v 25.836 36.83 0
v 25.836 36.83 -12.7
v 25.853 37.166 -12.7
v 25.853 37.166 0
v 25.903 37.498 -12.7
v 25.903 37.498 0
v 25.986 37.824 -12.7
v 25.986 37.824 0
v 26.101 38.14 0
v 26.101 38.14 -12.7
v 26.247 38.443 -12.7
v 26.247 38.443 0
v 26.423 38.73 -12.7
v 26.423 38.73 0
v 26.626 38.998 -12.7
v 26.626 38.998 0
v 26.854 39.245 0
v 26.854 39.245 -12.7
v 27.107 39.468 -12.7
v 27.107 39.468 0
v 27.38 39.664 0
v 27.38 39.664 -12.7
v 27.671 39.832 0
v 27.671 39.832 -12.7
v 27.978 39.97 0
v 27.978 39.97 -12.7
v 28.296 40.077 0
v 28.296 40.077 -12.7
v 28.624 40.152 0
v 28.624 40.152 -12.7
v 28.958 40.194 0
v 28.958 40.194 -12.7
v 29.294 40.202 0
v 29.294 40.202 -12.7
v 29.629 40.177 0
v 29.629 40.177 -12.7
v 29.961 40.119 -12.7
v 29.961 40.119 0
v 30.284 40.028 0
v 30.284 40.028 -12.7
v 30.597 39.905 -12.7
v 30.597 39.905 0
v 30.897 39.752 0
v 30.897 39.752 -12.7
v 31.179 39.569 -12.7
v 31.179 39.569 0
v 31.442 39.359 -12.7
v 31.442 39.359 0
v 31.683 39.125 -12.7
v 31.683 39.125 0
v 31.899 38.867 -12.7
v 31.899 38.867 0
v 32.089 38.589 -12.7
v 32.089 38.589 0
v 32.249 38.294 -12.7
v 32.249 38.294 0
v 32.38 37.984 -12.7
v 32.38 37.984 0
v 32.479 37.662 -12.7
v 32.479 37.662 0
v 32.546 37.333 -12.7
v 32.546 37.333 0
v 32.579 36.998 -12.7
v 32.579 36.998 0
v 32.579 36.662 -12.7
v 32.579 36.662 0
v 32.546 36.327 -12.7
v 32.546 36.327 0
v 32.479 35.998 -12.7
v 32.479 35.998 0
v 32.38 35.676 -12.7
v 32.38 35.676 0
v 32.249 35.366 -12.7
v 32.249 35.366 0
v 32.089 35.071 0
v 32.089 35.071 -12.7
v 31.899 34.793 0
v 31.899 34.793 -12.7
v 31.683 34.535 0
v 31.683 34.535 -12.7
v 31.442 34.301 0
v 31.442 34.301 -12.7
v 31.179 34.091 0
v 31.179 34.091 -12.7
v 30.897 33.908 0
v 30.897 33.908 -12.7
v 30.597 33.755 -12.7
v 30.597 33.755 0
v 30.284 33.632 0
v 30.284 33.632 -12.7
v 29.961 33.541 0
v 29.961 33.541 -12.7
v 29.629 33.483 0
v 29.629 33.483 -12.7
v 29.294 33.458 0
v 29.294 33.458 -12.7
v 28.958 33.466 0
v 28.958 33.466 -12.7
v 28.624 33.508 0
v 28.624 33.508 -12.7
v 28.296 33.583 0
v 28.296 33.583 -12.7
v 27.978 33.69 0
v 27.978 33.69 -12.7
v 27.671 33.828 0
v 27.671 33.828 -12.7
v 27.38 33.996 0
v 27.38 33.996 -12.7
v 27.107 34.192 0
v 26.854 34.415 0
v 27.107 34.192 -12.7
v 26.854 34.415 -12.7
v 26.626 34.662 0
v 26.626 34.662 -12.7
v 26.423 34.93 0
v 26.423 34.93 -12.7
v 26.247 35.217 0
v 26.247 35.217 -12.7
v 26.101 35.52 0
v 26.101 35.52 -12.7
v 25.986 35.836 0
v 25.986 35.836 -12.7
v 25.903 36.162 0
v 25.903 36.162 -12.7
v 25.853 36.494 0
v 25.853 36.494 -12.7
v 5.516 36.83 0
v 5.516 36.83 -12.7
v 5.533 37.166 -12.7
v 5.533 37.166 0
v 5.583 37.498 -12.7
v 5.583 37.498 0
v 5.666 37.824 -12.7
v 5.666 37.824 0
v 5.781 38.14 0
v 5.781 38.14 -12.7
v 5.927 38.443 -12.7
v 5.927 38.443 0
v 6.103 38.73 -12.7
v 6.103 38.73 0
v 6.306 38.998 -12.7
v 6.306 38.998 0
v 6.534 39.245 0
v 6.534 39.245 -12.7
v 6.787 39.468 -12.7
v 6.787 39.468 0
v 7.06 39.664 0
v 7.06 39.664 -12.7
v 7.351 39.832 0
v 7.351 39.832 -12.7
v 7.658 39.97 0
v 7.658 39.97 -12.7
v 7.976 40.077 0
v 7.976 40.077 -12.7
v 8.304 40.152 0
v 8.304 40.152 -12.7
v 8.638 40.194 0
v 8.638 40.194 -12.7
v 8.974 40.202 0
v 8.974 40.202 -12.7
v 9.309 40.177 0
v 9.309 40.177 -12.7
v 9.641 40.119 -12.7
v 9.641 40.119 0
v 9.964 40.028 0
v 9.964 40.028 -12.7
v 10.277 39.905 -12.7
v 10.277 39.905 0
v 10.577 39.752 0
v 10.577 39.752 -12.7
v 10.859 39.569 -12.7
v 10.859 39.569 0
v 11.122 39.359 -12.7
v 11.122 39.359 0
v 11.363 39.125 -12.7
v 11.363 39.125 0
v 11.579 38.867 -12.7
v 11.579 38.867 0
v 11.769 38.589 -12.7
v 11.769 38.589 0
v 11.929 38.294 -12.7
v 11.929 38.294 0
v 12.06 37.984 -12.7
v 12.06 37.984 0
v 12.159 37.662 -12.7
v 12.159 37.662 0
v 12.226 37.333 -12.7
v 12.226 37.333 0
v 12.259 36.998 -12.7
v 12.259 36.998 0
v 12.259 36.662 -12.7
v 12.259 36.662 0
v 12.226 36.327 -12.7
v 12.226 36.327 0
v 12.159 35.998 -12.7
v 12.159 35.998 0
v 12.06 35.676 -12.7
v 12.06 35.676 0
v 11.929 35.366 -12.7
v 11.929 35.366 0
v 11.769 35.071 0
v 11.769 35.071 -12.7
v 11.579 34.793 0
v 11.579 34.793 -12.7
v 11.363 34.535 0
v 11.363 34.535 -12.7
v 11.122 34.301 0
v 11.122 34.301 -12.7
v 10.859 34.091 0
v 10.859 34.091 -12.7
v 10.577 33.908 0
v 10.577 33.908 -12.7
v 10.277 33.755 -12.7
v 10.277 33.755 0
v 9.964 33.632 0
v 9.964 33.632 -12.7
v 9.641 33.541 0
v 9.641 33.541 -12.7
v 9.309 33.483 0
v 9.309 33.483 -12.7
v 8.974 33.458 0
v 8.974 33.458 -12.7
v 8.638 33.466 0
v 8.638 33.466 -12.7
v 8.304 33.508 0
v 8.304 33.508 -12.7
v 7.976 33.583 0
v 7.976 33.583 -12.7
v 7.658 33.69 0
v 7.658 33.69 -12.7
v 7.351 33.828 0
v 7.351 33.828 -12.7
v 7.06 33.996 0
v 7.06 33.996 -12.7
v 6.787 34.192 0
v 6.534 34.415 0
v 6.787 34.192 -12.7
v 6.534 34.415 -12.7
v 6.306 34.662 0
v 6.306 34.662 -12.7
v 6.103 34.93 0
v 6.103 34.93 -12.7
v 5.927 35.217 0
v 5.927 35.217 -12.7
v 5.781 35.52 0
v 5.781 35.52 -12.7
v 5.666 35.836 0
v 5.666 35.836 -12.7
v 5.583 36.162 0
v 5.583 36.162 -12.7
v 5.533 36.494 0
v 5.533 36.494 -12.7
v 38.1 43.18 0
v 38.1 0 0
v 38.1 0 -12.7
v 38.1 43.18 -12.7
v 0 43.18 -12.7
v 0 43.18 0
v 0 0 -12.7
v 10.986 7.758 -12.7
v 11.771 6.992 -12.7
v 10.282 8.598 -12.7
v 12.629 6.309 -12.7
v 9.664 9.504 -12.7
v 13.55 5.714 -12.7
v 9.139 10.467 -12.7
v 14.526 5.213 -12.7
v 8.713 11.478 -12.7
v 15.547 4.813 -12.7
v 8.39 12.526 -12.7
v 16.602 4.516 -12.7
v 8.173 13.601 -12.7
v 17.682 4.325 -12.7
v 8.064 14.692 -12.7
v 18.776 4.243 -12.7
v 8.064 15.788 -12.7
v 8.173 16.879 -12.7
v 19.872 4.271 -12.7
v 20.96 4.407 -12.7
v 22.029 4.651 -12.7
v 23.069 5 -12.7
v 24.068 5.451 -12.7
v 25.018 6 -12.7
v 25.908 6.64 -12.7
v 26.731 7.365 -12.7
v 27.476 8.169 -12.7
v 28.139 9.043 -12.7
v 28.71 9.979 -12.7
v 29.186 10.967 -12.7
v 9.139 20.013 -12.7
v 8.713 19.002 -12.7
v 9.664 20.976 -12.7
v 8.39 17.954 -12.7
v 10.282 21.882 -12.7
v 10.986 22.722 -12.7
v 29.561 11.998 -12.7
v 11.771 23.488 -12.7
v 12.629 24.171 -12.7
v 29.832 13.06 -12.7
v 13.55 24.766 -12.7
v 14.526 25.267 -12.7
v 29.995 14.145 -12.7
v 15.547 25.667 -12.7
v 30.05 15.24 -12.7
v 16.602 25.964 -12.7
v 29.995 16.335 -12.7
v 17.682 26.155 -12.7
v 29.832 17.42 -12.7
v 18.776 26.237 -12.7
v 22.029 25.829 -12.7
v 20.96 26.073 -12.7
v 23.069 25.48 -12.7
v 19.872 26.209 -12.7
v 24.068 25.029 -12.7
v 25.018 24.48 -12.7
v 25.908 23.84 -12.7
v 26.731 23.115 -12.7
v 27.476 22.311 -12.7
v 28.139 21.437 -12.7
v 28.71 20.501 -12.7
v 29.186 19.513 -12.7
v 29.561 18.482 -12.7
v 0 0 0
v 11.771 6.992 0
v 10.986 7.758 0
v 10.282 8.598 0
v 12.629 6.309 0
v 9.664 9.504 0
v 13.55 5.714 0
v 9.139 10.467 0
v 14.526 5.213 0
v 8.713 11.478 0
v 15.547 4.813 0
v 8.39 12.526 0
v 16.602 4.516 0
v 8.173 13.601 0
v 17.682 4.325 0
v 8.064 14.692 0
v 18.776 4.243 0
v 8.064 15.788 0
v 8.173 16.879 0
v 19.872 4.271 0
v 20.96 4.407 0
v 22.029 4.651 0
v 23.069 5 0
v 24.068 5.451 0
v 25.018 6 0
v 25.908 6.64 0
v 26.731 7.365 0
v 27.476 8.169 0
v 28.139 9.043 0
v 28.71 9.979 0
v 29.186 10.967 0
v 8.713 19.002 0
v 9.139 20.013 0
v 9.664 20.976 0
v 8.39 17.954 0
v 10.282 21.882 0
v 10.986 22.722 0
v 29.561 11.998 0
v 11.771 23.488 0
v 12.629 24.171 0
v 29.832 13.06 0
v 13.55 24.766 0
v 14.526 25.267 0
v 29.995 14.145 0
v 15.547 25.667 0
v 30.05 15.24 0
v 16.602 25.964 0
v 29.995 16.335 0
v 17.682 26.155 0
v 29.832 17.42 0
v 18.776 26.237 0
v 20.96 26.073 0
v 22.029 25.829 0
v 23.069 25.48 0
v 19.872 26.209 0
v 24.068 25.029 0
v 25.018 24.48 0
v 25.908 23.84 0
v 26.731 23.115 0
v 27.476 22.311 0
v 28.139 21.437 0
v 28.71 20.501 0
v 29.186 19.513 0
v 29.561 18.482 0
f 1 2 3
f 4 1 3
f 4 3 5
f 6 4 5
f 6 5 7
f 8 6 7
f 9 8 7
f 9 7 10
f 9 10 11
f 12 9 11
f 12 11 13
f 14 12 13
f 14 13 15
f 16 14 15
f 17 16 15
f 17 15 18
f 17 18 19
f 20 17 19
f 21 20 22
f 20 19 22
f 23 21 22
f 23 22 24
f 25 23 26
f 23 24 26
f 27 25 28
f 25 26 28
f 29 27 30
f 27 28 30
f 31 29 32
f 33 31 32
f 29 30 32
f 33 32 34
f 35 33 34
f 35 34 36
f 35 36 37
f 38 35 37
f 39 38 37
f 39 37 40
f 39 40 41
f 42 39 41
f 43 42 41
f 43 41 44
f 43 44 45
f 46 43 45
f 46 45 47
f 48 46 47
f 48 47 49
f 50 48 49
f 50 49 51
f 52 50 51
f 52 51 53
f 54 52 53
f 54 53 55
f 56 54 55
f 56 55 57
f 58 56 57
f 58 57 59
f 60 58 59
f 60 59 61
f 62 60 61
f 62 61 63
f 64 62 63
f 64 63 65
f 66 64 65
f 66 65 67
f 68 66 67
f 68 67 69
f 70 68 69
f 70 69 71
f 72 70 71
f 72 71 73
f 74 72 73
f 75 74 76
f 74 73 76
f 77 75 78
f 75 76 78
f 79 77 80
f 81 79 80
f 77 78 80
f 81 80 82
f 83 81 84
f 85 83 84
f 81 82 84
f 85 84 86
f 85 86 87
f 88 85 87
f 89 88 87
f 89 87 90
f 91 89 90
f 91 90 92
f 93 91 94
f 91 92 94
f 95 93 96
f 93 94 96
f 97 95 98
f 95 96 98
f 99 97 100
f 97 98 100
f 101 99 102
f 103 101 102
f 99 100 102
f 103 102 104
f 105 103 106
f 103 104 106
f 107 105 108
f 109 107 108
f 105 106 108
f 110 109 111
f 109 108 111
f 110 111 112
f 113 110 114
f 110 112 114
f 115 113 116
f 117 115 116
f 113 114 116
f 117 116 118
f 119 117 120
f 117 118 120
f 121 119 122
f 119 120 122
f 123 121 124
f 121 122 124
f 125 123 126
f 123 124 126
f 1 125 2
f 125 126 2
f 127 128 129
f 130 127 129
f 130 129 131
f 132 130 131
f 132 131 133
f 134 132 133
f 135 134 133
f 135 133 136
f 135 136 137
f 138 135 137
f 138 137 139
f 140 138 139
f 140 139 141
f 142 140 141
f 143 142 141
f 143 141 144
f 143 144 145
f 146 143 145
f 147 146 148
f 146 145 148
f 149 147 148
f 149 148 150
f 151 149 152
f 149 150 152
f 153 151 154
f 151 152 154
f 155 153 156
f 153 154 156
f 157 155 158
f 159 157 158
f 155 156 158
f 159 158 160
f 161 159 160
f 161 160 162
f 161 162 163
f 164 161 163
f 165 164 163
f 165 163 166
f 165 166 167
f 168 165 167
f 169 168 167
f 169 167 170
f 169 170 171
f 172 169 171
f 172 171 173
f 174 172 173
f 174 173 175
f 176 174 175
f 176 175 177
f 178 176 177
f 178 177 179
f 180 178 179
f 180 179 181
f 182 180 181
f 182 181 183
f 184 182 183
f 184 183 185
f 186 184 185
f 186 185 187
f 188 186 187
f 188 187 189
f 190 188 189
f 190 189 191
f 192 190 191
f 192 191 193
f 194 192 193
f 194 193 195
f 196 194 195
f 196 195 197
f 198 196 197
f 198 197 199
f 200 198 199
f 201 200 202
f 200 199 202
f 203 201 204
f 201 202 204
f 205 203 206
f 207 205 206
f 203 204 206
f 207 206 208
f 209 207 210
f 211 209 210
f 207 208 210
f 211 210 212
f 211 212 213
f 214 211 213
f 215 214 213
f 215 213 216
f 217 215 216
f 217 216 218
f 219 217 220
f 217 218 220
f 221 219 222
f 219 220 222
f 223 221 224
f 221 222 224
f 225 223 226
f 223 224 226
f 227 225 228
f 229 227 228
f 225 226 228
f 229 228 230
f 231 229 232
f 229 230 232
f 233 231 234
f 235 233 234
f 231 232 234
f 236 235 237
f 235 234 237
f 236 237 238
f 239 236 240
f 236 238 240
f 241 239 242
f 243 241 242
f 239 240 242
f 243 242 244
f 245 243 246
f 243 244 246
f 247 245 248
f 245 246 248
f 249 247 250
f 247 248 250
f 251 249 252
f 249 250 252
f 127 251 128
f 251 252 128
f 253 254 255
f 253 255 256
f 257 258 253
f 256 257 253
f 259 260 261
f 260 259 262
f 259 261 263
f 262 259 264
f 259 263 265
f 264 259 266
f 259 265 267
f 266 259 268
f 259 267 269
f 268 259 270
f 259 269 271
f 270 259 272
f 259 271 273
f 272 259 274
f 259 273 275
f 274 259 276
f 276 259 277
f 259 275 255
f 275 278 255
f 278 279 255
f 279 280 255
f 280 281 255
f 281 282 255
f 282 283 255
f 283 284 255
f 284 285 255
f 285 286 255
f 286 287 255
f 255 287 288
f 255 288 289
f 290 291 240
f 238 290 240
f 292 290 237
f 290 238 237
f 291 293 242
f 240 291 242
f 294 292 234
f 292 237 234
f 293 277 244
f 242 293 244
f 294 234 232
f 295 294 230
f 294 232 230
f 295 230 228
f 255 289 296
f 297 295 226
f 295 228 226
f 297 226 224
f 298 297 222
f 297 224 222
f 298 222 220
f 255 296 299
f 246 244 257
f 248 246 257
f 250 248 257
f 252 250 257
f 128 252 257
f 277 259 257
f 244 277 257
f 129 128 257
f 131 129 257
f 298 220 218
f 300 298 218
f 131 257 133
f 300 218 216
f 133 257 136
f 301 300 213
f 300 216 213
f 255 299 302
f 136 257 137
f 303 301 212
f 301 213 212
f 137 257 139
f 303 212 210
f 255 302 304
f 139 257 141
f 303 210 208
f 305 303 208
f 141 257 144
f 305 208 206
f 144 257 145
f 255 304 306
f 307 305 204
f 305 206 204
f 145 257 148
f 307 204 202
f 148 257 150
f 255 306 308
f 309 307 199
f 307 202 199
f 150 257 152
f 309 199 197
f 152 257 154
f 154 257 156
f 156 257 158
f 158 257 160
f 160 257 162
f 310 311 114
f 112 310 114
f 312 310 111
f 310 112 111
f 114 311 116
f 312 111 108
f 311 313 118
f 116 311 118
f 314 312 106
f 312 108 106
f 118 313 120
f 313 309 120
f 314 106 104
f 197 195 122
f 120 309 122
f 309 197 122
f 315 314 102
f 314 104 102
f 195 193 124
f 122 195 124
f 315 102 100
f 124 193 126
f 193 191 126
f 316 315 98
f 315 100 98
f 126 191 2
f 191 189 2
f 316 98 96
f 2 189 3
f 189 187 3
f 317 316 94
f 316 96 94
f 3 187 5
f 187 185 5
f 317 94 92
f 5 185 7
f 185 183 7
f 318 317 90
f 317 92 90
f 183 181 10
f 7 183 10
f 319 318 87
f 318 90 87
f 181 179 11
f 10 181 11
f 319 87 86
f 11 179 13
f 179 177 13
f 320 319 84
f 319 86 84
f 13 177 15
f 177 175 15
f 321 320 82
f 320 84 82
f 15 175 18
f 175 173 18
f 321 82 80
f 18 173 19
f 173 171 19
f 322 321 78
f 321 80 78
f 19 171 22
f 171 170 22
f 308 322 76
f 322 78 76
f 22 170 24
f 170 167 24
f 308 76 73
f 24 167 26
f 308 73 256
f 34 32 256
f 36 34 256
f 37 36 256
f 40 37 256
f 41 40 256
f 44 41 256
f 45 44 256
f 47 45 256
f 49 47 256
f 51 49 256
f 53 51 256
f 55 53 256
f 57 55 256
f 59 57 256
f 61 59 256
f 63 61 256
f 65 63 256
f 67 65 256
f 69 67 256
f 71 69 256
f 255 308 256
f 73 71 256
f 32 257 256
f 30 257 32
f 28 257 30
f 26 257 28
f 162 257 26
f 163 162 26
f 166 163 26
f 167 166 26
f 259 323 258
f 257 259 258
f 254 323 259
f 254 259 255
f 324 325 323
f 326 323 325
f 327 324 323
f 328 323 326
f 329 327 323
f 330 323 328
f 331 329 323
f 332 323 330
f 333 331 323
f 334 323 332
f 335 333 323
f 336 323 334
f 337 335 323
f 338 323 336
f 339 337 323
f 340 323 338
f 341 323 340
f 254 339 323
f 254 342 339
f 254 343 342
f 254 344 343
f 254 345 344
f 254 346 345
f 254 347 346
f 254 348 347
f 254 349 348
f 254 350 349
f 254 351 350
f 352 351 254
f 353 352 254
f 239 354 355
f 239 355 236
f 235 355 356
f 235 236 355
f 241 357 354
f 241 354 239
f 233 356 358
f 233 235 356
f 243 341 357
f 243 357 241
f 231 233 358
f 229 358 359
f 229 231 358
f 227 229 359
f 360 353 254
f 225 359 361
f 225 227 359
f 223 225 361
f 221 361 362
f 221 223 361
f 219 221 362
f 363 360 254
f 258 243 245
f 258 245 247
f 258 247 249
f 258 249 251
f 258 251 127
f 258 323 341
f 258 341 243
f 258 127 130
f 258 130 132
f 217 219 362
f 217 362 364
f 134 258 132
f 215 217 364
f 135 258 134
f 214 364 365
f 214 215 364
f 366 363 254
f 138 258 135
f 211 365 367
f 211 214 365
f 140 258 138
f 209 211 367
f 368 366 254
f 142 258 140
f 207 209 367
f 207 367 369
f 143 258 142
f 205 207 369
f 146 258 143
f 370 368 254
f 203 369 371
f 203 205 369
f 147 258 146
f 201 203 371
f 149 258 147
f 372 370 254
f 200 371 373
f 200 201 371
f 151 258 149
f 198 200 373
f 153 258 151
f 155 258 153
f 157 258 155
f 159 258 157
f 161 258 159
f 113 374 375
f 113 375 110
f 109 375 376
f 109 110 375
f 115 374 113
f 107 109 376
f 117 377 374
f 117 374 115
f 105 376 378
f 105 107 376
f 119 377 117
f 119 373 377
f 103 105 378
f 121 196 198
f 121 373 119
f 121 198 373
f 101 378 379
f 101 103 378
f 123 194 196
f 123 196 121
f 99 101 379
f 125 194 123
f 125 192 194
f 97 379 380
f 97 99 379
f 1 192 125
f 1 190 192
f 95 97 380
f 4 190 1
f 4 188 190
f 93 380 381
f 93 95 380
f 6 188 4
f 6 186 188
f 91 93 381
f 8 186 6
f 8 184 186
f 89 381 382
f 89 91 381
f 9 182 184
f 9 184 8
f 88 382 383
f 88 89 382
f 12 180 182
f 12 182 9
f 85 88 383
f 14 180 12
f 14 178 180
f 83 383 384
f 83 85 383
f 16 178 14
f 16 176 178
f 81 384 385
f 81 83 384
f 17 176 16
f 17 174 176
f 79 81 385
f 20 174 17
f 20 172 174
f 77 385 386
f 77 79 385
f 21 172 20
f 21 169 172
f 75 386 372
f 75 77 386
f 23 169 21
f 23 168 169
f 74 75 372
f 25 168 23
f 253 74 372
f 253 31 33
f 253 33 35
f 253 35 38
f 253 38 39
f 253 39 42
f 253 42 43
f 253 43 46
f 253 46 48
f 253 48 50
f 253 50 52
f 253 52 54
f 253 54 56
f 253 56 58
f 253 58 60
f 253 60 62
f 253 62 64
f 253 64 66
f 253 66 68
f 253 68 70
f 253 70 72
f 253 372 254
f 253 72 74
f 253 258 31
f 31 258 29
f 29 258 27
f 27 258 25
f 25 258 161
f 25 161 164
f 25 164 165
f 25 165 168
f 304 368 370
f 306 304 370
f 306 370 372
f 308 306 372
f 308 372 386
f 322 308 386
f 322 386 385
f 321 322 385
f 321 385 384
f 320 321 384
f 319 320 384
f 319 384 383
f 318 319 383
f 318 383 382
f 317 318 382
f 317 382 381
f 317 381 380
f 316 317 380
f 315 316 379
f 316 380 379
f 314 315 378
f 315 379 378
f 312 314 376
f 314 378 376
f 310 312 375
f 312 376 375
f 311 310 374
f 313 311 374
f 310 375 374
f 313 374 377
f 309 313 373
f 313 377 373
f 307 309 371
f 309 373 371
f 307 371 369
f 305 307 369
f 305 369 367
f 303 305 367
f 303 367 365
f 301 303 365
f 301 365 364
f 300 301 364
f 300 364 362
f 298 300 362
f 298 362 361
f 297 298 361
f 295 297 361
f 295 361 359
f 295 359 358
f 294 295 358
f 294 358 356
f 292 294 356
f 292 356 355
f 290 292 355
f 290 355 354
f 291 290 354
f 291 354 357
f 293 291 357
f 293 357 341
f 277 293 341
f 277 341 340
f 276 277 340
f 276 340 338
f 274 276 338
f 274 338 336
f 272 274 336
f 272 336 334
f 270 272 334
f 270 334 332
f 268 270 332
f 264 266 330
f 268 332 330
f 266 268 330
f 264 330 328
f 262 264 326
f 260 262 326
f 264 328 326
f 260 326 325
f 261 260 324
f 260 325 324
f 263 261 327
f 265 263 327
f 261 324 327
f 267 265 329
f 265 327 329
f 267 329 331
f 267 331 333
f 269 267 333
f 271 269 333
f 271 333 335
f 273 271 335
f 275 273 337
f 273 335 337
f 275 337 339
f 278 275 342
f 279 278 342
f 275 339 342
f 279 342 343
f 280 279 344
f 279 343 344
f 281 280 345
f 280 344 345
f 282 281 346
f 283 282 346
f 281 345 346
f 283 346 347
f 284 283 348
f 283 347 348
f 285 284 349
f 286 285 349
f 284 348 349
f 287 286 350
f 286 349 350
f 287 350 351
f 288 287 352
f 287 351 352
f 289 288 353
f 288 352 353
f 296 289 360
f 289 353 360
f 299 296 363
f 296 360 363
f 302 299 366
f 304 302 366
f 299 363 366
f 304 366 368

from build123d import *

# Parameters (mm, degrees)
SKETCH1_W                        = 38.1
SKETCH1_H                        = 43.18
BOSS_EXTRUDE1_DEPTH              = 12.7
SKETCH3_R                        = 11
CUT_EXTRUDE1_DEPTH               = 13.7
F_17_64_0_26563_DIAMETER_HOLE1_D = 6.747002


with BuildPart() as part:
    # Sketch1 → Boss-Extrude1 (new body)
    with BuildSketch(Plane.XY):
        with Locations((19.05, 21.59)):
            Rectangle(SKETCH1_W, SKETCH1_H)
    extrude(amount=-BOSS_EXTRUDE1_DEPTH)

    # Sketch3 → Cut-Extrude1 (cut, through all)
    with BuildSketch(Plane.XY):
        with Locations((19.05, 15.24)):
            Circle(SKETCH3_R)
    extrude(amount=-CUT_EXTRUDE1_DEPTH, mode=Mode.SUBTRACT)

    # 17/64 (0.26563) Diameter Hole1 (through all)
    with Locations(Plane(origin=(29.21, 36.83, 0), x_dir=(1, 0, 0), z_dir=(0, 0, 1))):
        with Locations((0, 0), (-20.32, 0)):
            Hole(F_17_64_0_26563_DIAMETER_HOLE1_D / 2)


solid = part.part
